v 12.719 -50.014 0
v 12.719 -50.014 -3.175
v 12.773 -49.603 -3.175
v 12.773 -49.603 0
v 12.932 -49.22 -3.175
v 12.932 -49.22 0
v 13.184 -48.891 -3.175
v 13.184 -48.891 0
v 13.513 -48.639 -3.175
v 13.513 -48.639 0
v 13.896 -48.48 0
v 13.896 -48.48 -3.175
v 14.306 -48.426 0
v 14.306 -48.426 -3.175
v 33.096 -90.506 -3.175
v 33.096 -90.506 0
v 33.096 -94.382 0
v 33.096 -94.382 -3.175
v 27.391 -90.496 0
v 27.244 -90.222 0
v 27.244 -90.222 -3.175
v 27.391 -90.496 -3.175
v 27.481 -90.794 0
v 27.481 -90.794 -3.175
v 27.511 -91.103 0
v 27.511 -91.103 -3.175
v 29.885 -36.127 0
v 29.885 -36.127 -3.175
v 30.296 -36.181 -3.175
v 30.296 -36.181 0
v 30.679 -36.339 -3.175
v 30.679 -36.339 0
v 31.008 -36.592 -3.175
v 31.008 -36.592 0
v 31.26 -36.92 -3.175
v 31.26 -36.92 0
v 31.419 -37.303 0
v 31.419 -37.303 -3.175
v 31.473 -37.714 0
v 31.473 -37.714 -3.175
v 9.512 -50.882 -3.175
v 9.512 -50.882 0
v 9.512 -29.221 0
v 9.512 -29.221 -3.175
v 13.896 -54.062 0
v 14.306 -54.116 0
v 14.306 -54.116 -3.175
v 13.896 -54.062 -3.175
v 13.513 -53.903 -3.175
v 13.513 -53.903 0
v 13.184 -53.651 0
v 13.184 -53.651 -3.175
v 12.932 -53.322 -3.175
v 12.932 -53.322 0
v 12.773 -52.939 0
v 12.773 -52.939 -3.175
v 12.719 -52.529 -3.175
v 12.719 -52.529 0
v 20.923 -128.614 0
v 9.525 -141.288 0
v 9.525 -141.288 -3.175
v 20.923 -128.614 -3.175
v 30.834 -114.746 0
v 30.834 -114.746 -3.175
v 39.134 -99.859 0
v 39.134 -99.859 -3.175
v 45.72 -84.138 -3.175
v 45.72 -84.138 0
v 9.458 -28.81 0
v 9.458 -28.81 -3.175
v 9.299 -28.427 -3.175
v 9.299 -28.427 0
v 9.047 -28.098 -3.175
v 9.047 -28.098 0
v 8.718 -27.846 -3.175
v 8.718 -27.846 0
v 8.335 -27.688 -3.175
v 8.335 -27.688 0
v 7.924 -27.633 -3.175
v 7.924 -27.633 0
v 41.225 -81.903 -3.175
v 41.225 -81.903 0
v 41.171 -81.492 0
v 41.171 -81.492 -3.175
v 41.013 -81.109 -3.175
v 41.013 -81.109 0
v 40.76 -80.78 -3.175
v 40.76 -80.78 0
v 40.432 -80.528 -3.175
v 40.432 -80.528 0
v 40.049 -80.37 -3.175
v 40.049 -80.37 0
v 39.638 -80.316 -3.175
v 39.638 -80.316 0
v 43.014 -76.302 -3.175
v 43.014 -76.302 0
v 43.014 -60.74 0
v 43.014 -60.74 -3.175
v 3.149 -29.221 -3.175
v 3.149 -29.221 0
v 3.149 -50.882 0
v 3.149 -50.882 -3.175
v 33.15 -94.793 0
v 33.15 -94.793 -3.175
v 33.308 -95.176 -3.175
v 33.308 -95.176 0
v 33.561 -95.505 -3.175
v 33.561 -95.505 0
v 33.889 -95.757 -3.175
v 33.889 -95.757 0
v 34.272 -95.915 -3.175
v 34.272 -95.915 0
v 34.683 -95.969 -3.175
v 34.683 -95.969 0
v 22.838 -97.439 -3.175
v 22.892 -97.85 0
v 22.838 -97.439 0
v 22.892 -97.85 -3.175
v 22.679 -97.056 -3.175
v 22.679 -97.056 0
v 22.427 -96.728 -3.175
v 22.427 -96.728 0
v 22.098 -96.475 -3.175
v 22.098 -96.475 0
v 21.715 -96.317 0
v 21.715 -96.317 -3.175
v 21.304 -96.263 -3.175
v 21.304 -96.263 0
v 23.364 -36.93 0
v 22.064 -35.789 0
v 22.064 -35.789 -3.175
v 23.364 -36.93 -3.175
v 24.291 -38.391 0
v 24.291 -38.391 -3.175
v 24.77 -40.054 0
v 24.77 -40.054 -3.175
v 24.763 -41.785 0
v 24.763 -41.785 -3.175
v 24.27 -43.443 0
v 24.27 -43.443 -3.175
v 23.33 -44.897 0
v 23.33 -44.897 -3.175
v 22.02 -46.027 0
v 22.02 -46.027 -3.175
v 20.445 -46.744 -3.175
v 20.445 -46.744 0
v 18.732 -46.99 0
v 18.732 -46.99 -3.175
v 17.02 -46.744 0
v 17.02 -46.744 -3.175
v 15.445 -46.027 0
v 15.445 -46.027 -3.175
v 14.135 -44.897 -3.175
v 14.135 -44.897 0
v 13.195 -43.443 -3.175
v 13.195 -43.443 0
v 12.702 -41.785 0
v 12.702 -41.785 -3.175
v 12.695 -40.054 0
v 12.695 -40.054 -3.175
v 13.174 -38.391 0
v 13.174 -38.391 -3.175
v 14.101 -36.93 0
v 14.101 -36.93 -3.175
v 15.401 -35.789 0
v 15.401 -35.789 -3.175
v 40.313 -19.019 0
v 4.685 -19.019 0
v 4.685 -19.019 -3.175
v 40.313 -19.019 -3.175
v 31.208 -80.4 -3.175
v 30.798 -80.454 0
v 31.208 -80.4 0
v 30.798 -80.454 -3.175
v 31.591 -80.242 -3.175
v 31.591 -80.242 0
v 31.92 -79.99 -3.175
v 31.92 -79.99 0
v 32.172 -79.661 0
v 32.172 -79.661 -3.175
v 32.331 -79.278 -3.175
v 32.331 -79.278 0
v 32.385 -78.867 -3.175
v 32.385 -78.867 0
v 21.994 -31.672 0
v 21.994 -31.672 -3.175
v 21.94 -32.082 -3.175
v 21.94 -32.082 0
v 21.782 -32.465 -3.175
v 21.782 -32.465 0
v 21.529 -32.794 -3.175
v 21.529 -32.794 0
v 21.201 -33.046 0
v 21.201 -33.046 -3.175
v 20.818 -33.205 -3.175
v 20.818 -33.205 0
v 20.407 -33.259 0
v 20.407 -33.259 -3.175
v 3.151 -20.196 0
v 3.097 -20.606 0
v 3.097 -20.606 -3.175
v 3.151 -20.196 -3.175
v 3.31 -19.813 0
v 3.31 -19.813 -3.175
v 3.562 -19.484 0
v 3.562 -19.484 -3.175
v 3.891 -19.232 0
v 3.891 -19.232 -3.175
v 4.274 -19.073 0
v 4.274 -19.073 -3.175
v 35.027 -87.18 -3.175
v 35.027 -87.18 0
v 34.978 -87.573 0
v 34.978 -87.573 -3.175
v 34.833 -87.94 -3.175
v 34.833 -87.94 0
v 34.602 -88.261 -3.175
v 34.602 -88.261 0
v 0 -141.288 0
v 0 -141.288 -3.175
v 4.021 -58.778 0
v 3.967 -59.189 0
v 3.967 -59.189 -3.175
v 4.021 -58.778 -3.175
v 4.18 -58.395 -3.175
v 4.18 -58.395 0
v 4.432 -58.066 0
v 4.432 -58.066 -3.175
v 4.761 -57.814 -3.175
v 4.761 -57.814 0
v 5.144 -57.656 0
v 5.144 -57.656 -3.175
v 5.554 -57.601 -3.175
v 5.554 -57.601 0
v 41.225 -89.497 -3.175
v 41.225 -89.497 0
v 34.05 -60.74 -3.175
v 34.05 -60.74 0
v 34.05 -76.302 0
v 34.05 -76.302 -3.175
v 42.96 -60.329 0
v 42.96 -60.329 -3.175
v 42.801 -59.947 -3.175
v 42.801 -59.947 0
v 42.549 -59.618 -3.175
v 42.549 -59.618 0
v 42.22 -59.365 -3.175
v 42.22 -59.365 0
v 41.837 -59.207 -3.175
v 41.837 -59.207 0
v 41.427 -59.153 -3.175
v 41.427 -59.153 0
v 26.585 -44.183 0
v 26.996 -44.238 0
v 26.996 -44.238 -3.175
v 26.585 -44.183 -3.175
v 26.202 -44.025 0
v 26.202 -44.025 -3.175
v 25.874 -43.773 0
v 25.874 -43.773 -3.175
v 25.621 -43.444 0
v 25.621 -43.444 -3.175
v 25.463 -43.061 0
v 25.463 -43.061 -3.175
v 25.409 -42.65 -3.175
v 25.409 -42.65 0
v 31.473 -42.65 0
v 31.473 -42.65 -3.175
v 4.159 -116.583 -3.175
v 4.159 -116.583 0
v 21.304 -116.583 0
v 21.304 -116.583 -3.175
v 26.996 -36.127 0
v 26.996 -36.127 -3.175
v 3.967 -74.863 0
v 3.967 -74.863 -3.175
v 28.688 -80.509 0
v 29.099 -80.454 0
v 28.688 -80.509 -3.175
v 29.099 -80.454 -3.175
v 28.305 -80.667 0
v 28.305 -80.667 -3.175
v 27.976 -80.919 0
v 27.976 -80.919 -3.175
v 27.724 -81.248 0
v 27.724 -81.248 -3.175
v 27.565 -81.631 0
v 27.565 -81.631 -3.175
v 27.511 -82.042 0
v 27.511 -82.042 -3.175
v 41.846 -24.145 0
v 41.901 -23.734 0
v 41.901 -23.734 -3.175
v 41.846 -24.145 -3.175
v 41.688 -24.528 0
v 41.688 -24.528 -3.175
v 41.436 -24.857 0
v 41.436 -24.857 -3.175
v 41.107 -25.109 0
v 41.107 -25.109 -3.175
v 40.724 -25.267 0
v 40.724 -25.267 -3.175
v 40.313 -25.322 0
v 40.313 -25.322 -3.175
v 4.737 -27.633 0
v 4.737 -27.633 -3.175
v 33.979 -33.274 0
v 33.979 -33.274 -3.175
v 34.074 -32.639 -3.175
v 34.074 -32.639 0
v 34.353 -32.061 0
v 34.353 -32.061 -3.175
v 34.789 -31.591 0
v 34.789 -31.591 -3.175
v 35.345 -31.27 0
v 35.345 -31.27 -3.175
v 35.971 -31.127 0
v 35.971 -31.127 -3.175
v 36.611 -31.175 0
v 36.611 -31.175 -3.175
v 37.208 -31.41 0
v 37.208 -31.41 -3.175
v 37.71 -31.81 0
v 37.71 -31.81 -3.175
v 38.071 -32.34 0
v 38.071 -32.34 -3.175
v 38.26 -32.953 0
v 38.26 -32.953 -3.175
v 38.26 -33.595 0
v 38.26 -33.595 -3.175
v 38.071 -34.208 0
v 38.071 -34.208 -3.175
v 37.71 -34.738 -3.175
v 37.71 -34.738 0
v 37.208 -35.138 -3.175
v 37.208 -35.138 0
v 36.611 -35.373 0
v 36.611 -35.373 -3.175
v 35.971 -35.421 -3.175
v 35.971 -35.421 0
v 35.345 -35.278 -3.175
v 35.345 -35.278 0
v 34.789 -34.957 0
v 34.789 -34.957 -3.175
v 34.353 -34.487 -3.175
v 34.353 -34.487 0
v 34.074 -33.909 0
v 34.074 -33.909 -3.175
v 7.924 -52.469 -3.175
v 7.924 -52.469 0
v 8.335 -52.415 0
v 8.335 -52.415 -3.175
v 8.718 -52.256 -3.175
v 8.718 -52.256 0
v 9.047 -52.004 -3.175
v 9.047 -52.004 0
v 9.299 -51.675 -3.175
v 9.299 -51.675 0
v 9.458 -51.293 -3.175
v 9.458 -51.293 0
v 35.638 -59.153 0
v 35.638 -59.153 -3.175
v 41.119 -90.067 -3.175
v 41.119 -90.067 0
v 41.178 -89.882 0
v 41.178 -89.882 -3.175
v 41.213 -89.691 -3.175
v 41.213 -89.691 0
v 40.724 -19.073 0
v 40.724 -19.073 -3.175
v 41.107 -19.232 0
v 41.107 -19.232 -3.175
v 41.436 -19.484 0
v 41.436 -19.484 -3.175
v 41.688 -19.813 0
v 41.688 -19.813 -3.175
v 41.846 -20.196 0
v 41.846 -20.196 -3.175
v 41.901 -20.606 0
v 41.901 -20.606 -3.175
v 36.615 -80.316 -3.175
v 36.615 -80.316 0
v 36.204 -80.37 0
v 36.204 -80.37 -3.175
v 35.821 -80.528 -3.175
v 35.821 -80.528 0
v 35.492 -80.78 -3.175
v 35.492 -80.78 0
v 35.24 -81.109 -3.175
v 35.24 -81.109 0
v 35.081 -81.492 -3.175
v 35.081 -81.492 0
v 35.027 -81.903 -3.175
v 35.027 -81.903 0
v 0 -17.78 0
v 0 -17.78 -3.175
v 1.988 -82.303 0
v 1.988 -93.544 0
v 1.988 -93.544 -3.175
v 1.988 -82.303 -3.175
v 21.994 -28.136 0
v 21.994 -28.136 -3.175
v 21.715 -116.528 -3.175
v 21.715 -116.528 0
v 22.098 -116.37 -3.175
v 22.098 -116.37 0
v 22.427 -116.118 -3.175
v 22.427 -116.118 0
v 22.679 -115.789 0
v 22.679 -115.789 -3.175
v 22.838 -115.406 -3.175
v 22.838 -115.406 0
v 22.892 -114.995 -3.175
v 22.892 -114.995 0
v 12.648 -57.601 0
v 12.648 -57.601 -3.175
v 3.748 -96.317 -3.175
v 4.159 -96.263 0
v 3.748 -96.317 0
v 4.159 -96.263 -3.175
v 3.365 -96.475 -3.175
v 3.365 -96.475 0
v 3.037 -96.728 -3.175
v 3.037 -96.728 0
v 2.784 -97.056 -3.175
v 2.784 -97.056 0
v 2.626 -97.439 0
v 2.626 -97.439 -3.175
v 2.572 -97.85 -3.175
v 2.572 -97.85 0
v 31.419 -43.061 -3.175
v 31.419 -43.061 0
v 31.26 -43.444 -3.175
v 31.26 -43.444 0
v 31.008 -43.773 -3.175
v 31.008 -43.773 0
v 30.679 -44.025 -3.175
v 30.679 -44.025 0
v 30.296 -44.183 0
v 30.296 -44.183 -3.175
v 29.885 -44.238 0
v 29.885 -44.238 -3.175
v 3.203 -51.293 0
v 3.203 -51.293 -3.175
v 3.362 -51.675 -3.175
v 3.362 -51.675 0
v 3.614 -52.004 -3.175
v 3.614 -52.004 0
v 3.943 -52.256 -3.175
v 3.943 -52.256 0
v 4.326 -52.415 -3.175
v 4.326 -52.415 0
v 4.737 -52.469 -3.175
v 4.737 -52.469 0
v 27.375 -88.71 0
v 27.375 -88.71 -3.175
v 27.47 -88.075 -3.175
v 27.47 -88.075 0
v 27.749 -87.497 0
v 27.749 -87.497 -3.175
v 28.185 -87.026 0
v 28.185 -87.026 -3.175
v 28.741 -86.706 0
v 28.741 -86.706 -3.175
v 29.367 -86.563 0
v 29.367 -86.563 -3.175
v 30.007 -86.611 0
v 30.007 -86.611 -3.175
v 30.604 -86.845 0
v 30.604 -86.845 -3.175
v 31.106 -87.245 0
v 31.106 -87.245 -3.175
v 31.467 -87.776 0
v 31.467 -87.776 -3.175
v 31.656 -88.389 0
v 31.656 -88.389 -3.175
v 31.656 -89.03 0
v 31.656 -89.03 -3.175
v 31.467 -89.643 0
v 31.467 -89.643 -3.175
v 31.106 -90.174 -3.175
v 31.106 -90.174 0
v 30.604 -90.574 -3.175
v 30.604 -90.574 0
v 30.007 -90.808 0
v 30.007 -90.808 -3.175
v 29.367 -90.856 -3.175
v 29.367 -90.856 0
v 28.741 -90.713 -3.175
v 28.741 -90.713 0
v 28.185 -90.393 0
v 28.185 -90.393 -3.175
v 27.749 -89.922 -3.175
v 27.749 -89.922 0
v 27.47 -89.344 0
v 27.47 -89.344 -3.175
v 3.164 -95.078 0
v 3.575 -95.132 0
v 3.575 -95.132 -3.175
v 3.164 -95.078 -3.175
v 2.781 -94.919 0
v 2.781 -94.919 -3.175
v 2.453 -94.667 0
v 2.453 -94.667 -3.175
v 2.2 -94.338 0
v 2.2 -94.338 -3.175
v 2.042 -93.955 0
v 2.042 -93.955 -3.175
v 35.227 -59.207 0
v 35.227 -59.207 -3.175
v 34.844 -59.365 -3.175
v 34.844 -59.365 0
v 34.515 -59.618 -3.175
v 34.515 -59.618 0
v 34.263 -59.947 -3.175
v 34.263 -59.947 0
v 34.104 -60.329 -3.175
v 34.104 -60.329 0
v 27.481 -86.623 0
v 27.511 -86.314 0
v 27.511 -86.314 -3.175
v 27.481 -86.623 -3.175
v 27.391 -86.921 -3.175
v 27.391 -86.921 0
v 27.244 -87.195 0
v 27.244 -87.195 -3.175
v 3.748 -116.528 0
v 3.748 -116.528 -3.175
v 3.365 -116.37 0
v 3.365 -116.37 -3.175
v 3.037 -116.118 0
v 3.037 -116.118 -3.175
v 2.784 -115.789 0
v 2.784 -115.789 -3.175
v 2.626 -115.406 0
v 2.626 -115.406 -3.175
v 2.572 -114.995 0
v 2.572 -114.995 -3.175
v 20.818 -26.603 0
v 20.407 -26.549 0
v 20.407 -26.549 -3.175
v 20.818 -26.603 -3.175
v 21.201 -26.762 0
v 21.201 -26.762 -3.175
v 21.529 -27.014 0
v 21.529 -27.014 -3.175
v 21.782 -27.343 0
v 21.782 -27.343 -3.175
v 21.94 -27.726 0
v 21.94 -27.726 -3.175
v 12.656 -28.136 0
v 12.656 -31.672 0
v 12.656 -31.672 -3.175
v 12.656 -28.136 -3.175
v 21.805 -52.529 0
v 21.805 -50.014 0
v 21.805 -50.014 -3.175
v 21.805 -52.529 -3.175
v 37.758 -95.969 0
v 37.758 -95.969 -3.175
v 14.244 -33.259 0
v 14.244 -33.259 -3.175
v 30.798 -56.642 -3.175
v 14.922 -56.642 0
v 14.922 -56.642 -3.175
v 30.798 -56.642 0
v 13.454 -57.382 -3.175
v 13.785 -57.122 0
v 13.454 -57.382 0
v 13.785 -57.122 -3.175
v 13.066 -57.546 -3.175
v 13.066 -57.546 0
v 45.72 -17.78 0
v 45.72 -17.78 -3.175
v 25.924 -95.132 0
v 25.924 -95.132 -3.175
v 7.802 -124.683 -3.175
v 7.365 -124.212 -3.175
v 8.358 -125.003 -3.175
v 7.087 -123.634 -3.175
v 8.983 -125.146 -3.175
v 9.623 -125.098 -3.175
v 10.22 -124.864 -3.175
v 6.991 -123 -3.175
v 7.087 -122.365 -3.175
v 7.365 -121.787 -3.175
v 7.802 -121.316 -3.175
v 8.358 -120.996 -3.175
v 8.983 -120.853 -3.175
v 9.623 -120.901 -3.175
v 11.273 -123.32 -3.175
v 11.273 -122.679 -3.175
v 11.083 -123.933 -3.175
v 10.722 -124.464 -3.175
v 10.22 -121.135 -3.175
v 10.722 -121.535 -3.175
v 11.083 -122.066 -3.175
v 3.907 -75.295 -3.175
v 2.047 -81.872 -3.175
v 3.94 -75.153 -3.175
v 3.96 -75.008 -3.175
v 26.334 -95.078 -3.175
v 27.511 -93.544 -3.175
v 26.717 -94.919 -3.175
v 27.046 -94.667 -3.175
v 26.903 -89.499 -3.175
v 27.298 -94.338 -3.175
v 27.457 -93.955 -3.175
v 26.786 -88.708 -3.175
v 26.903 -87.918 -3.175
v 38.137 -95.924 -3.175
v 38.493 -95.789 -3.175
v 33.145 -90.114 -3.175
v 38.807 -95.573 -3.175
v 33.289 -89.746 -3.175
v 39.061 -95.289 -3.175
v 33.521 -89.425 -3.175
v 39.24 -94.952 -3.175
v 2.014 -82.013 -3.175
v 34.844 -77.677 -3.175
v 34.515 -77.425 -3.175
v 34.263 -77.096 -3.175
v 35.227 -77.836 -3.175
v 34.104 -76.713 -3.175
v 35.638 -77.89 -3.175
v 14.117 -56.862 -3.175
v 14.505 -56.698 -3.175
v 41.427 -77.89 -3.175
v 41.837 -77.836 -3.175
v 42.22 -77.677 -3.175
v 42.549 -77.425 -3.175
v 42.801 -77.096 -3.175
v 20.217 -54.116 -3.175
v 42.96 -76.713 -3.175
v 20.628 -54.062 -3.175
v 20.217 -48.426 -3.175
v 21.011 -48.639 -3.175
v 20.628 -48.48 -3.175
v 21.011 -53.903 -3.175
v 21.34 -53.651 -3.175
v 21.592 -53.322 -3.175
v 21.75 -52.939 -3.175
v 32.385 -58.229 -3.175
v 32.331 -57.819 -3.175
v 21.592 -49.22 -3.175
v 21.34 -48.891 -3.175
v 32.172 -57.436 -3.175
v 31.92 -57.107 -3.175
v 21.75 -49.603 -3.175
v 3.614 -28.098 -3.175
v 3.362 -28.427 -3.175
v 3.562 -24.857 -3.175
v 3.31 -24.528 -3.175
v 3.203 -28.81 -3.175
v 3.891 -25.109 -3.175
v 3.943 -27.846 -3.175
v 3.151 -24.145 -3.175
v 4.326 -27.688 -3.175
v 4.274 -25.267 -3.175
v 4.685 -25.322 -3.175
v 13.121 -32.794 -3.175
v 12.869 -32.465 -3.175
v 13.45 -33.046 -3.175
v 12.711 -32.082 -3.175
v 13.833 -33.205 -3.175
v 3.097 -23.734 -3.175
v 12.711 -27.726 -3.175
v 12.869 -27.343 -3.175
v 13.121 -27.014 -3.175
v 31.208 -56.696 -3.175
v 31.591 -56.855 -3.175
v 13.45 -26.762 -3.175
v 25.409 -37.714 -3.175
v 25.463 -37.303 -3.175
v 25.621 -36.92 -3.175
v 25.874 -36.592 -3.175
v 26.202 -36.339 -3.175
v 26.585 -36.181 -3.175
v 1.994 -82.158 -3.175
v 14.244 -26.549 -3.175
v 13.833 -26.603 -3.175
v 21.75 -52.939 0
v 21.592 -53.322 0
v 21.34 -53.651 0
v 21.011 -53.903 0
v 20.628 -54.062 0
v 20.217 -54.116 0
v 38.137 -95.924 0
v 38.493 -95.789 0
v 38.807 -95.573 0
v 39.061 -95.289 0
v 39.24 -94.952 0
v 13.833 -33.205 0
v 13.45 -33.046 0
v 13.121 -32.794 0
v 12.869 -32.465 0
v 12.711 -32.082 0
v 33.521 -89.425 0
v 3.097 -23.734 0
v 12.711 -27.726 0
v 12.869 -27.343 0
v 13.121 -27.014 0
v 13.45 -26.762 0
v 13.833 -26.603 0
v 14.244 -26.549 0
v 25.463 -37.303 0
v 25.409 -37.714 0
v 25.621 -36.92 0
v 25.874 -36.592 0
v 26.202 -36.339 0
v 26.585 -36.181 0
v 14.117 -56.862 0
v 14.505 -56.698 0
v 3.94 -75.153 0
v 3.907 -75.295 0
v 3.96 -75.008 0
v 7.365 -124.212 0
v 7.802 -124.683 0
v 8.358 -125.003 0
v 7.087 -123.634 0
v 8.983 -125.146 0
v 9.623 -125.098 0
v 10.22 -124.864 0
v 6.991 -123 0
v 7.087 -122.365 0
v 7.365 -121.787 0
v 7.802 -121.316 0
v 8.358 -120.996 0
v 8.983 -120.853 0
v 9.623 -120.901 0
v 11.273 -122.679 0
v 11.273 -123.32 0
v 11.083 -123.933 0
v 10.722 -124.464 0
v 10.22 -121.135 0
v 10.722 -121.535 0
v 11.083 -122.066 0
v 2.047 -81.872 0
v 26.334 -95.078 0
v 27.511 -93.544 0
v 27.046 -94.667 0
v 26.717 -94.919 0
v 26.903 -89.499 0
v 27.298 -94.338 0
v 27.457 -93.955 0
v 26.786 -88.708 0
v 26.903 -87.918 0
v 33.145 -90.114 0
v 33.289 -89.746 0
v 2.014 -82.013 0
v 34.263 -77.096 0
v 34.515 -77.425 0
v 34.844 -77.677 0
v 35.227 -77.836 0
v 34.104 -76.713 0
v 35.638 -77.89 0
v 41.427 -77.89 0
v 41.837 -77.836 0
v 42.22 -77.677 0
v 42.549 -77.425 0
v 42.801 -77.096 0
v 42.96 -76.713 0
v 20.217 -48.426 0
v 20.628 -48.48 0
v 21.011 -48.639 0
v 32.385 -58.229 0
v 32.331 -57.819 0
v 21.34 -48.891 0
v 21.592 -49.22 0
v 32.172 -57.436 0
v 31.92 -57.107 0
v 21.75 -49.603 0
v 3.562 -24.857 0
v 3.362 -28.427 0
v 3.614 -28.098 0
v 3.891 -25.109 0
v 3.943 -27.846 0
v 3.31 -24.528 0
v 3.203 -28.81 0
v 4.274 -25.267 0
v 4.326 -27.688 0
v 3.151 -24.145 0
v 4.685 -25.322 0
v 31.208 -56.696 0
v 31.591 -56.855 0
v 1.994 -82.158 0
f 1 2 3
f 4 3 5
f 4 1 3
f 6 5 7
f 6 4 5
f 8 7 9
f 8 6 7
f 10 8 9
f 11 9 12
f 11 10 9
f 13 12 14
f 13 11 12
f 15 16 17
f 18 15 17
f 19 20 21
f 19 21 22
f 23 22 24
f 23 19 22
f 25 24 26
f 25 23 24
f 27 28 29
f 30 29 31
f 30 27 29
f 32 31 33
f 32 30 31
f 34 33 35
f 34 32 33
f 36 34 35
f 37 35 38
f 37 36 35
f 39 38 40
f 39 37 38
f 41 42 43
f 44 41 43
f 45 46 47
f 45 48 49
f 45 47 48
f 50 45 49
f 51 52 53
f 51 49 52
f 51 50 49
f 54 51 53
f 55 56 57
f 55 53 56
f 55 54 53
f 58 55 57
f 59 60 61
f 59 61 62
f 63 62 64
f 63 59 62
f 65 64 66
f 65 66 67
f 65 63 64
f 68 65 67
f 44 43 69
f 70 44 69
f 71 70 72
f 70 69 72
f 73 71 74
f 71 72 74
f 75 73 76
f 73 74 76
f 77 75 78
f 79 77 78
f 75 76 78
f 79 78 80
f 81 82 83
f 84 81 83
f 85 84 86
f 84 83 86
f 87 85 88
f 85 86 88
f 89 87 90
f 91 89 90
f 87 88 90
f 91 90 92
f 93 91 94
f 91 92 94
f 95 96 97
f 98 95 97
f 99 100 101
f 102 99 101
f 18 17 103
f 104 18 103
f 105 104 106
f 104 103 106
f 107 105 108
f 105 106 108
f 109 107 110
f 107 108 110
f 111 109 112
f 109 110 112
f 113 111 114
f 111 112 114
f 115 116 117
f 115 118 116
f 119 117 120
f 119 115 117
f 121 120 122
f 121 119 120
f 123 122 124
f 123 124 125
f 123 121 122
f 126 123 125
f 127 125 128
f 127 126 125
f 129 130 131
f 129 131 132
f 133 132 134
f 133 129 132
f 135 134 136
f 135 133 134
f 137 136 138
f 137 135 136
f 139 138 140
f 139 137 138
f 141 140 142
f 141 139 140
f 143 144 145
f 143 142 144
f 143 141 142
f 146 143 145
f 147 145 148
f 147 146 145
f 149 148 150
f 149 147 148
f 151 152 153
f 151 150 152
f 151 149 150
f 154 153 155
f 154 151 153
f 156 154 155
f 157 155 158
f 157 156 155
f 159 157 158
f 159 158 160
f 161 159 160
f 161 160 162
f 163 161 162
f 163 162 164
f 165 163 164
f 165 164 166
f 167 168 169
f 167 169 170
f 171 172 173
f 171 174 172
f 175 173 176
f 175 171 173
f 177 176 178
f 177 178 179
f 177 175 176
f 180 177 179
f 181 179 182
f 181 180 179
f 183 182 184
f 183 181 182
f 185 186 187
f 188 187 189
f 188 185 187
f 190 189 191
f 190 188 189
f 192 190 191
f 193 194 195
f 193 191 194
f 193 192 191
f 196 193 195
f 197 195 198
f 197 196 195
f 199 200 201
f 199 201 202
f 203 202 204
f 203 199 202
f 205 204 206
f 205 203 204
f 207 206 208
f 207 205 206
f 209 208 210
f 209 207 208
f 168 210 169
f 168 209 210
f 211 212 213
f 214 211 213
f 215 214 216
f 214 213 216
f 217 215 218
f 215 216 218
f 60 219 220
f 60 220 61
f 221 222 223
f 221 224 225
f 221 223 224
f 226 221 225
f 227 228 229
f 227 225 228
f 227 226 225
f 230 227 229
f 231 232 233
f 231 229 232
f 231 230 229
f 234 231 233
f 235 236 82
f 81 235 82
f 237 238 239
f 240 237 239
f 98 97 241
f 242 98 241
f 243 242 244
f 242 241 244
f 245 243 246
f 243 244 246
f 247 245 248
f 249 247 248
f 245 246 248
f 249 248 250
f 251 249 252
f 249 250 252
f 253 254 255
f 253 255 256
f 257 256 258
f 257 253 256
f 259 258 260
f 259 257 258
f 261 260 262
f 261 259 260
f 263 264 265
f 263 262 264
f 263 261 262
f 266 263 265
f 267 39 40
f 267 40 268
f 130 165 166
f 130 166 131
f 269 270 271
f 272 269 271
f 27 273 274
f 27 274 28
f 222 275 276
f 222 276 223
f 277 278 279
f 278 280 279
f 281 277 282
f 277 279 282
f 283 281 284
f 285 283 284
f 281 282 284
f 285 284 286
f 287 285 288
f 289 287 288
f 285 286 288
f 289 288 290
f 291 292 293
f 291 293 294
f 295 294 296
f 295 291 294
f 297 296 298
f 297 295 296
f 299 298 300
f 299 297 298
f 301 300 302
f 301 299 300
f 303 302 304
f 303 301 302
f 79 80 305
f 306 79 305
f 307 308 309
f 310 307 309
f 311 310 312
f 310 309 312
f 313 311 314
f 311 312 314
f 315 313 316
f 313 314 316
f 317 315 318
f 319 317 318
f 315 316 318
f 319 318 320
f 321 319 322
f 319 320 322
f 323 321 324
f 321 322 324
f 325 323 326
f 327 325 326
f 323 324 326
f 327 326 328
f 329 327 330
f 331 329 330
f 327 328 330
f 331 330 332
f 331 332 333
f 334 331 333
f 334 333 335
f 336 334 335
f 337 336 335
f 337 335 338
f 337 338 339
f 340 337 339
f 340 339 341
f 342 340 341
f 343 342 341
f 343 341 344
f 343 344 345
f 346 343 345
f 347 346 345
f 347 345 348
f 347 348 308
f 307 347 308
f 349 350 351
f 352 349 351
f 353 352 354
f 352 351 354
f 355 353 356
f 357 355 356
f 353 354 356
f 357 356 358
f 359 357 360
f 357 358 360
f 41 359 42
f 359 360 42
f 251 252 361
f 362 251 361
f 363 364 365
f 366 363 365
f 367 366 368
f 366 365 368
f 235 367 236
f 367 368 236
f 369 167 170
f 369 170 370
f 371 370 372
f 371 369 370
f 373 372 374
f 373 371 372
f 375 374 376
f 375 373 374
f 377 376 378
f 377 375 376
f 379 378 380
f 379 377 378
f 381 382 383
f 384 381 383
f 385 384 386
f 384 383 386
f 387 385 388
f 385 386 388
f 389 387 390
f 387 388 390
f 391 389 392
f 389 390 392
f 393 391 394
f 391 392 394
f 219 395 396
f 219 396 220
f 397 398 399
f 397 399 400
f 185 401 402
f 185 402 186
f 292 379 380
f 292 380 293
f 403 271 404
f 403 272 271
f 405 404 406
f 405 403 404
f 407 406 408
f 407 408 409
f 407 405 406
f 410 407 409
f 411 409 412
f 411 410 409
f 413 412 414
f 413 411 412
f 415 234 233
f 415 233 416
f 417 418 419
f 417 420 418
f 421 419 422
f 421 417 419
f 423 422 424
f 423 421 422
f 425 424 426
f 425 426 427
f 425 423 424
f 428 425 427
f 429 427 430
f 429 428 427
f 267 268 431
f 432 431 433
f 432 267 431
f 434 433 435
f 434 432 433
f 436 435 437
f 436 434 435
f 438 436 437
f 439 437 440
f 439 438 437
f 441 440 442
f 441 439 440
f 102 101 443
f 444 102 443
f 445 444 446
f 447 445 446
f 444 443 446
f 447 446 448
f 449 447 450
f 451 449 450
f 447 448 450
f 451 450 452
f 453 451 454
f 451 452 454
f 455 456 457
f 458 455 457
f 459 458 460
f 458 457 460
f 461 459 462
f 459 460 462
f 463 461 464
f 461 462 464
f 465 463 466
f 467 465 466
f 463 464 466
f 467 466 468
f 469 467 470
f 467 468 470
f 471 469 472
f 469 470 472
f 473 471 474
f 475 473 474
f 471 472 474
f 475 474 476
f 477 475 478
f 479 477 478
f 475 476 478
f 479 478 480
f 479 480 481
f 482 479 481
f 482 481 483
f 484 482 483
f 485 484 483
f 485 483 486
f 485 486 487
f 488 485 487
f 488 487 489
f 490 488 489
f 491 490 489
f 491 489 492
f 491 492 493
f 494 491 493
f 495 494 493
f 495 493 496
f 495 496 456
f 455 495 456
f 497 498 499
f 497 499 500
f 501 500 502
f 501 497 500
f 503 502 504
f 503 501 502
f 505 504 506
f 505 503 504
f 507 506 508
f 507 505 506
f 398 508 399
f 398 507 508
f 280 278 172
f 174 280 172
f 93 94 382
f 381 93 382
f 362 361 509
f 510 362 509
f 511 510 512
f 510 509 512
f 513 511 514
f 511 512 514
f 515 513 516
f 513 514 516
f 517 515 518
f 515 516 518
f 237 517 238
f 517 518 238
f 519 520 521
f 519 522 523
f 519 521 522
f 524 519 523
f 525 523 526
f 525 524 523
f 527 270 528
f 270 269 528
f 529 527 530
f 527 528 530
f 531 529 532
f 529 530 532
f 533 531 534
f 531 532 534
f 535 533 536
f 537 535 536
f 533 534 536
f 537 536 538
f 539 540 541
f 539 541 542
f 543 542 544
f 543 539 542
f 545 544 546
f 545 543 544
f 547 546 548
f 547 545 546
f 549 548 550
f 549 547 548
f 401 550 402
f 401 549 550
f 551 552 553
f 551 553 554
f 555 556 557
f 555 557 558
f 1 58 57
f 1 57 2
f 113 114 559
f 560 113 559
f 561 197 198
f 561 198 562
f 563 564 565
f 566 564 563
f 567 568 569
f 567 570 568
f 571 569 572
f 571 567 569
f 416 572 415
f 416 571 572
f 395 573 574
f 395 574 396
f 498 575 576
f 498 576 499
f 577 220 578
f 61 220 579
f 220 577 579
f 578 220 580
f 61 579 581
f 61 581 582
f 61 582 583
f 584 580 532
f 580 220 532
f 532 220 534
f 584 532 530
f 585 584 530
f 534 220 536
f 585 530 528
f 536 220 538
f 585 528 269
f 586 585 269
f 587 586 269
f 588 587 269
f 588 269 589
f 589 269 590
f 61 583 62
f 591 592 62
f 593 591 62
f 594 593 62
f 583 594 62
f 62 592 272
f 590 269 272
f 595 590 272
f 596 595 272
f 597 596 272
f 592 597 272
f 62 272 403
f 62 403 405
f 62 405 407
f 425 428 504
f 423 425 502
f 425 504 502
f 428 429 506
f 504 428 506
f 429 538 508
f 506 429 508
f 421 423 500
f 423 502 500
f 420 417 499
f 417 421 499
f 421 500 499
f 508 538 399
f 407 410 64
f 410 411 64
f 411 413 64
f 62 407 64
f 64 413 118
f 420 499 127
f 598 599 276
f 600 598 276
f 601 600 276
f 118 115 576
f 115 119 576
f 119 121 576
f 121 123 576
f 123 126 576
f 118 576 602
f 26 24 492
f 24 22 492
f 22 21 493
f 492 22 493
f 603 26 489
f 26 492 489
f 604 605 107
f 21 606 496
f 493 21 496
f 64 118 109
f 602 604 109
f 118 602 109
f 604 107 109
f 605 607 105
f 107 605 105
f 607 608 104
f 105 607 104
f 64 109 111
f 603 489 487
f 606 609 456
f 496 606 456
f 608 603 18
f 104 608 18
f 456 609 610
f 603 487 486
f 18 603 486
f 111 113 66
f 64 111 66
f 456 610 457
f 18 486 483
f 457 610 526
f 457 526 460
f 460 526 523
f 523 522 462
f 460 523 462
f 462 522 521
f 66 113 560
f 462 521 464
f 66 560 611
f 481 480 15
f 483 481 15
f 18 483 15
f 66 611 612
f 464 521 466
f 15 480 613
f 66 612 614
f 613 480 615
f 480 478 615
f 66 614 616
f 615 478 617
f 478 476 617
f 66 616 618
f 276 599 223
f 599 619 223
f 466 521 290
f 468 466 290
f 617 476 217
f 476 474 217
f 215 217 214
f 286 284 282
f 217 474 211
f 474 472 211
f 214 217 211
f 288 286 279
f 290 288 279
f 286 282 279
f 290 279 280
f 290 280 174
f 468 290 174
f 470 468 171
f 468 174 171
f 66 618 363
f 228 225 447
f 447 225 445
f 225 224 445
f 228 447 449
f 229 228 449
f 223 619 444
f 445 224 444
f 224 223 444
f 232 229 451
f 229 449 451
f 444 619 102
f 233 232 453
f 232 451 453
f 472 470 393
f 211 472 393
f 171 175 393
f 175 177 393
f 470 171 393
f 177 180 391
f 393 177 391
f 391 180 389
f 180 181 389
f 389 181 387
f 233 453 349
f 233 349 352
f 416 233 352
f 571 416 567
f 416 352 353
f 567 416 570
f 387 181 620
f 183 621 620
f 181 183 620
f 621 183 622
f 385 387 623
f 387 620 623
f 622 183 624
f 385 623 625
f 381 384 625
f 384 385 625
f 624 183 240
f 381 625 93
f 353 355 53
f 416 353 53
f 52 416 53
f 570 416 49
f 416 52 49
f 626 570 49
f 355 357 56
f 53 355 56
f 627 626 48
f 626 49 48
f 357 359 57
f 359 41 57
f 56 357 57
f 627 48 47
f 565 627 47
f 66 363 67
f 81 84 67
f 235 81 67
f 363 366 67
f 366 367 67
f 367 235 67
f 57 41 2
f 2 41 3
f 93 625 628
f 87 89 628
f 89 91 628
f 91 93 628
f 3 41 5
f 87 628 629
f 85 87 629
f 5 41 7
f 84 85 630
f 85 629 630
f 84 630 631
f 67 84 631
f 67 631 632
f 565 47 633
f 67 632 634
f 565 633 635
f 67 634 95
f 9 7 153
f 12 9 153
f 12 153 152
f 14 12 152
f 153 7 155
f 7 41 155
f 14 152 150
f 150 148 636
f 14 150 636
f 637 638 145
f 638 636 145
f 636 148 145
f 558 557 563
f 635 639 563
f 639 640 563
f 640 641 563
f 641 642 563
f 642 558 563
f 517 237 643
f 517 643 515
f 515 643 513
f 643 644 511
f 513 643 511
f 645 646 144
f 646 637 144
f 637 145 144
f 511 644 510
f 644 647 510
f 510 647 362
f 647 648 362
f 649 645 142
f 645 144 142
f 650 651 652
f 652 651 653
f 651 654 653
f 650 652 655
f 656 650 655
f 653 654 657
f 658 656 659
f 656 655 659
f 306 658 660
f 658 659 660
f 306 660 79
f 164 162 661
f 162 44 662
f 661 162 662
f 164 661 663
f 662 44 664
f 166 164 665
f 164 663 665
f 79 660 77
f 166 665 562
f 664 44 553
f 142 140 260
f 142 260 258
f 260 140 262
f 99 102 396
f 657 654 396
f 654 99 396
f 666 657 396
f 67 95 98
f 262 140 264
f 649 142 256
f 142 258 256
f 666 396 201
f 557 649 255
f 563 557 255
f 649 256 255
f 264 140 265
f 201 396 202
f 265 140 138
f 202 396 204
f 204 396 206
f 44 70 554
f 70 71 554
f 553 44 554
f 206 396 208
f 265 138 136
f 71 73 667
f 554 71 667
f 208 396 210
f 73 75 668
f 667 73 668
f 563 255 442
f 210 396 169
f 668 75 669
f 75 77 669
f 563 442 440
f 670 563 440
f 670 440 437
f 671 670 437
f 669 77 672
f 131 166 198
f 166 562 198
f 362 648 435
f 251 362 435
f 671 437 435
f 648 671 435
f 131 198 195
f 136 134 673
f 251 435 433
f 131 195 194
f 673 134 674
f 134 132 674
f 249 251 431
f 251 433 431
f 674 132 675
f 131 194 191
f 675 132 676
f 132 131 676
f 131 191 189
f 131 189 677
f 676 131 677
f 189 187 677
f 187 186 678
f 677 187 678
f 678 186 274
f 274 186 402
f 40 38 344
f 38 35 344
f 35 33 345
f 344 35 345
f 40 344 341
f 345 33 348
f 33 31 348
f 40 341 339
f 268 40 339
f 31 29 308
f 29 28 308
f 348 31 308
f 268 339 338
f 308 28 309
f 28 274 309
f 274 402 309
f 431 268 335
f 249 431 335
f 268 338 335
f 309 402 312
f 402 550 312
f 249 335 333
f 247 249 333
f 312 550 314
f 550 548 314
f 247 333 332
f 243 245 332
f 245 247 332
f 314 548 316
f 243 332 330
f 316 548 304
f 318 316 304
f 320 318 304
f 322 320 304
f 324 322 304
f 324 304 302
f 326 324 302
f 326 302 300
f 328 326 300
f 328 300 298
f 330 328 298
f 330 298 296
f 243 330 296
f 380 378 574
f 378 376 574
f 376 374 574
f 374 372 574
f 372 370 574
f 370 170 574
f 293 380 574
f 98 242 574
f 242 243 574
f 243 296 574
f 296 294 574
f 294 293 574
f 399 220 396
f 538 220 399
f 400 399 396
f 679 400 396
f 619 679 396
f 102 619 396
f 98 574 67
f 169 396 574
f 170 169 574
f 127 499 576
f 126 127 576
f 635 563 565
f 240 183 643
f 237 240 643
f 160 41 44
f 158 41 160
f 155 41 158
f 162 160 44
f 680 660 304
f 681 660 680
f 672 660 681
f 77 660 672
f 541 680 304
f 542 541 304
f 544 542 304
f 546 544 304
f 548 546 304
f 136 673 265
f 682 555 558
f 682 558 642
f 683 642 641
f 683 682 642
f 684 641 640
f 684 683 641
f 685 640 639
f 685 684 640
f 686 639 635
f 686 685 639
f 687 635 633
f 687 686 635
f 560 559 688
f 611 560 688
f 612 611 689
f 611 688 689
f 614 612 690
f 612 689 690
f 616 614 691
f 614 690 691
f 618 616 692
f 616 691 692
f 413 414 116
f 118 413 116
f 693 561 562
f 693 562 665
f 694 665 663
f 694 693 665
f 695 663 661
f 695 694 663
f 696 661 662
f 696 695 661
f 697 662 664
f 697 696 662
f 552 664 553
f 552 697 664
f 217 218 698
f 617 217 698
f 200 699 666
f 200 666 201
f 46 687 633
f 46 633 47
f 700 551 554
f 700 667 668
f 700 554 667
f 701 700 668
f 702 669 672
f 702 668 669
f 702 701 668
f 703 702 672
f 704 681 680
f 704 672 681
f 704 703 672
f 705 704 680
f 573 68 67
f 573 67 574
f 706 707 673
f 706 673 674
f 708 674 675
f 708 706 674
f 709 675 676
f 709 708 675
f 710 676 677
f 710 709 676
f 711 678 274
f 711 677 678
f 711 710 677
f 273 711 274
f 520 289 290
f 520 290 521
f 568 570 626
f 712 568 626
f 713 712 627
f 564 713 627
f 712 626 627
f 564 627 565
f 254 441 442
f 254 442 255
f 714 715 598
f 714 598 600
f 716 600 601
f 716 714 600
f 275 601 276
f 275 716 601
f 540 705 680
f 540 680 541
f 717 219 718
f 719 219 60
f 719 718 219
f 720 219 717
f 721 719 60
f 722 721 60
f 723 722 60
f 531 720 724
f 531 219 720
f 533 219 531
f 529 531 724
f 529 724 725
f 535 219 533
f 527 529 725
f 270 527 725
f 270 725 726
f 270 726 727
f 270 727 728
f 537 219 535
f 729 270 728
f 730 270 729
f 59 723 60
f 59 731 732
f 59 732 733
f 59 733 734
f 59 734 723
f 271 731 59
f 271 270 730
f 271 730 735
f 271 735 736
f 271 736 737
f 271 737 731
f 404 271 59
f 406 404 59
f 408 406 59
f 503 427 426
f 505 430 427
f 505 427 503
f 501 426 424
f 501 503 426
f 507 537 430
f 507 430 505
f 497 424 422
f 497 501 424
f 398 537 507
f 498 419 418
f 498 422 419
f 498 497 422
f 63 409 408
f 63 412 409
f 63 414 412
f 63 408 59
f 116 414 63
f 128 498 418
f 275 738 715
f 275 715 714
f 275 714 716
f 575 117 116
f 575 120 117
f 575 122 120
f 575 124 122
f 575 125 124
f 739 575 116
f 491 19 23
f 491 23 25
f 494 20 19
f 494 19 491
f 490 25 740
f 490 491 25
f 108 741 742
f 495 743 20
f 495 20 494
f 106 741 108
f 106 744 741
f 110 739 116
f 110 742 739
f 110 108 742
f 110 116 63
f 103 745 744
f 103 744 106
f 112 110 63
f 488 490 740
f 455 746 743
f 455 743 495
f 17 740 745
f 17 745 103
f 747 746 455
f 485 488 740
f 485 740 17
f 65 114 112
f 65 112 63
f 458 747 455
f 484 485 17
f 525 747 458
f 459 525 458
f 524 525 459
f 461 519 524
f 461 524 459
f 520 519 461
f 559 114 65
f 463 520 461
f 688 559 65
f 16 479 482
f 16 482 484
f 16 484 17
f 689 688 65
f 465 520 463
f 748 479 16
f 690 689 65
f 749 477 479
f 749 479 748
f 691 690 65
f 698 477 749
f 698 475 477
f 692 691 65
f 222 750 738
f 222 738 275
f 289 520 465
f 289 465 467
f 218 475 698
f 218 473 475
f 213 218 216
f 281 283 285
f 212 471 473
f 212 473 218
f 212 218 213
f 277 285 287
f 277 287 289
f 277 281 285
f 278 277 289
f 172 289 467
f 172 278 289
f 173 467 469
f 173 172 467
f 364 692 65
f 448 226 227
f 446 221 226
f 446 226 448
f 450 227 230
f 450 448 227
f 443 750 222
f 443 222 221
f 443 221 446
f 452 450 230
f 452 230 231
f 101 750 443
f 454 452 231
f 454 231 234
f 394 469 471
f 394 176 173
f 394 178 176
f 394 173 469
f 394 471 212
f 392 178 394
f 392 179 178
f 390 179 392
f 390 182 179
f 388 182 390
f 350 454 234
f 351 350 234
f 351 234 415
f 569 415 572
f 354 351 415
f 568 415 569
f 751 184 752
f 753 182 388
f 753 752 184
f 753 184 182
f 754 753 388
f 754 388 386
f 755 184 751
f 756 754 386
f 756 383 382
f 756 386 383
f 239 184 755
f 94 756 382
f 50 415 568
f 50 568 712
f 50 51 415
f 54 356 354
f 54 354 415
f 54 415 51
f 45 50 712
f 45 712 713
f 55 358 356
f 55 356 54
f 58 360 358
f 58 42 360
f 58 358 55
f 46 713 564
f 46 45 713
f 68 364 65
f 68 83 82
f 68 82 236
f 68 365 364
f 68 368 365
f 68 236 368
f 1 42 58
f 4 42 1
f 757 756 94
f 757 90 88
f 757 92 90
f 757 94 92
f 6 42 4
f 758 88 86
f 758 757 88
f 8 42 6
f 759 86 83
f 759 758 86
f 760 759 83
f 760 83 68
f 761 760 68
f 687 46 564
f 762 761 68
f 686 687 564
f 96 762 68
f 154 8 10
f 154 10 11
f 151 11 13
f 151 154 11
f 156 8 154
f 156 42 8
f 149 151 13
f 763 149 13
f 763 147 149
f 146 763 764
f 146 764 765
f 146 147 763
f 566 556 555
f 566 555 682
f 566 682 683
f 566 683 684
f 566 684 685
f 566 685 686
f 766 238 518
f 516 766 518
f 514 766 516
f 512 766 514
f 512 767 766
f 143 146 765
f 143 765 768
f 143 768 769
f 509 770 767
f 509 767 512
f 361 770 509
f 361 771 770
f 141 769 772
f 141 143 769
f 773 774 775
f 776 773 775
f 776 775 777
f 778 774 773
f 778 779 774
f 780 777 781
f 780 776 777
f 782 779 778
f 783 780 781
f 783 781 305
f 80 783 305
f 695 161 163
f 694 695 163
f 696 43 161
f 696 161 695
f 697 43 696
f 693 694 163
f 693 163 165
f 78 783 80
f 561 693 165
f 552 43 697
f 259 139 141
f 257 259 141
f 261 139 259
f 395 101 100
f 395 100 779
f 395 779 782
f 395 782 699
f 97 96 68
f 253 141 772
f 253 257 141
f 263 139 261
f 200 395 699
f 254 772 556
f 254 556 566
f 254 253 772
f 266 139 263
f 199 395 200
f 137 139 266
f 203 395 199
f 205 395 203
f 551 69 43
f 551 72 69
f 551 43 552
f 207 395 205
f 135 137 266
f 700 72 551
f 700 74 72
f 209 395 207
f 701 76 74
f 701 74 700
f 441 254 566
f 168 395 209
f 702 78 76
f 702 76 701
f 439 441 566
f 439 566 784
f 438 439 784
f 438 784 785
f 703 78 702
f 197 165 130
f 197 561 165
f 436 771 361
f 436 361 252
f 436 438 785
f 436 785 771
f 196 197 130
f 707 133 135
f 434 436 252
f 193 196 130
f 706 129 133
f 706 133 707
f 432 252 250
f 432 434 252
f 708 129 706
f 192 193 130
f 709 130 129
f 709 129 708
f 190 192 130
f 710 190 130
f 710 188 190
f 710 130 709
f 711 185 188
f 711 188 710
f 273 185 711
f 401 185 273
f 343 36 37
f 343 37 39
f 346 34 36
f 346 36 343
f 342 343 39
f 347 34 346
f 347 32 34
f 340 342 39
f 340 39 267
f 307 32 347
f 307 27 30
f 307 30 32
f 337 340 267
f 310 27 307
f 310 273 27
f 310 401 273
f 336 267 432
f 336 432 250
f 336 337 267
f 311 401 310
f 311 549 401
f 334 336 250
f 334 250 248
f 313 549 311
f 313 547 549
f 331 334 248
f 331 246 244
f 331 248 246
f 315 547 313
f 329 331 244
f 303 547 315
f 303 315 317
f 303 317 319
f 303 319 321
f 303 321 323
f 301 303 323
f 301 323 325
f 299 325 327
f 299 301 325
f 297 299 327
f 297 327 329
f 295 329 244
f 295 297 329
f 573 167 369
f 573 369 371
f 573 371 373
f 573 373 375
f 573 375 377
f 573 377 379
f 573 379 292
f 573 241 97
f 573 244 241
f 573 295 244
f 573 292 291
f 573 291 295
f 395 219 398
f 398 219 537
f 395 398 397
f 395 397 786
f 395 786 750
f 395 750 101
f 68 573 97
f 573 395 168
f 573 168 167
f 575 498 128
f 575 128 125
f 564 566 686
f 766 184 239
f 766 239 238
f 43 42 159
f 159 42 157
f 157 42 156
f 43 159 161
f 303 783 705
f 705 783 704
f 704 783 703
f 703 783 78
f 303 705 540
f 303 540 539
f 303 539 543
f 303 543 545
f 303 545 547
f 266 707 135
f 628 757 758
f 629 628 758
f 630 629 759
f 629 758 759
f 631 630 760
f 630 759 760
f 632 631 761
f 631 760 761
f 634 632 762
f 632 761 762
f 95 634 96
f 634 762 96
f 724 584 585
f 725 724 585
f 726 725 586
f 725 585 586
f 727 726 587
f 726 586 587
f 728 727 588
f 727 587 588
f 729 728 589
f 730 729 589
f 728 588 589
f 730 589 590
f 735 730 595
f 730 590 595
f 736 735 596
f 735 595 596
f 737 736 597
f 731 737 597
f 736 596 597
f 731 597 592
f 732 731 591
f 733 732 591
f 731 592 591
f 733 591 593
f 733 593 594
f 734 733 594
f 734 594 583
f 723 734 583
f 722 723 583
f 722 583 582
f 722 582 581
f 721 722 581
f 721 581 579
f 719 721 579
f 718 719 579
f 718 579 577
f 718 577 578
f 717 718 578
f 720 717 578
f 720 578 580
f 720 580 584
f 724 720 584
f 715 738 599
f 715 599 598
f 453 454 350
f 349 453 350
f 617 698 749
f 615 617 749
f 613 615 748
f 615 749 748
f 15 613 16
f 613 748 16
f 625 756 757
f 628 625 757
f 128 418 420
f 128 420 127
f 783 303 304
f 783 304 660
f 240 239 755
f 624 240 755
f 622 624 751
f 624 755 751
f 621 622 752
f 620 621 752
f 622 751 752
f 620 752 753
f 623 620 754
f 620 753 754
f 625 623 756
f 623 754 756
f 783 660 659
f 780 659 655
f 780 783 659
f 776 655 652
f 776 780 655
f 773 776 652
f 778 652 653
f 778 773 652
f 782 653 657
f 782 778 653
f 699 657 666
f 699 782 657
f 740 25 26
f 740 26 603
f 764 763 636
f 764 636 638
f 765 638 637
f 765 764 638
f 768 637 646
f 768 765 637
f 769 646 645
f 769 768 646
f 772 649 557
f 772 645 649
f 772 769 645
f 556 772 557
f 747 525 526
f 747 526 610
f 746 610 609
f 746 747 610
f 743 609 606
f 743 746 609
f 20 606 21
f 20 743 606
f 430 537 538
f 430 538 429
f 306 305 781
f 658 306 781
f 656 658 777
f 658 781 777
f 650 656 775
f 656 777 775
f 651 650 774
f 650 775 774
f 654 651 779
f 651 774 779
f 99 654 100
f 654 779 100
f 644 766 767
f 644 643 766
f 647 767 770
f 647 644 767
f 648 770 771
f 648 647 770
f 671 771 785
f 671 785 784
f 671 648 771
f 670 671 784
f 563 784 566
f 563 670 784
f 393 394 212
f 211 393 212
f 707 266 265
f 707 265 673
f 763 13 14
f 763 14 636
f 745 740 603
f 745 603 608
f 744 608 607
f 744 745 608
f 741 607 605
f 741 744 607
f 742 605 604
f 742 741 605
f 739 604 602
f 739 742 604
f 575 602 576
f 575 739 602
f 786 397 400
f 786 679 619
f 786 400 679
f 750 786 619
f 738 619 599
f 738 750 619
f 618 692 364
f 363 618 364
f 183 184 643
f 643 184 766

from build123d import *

# Parameters (mm, degrees)
SKETCH1_R             = 1.190050877
BOSS_EXTRUDE1_DEPTH   = 3.175
CUT_EXTRUDE1_DEPTH    = 4.175
SKETCH12_W            = 19.05
SKETCH12_H            = 23.8125
CUT_EXTRUDE2_DEPTH    = 4.175
SKETCH17_W            = 20.32
SKETCH17_H            = 20.32
CUT_EXTRUDE3_DEPTH    = 4.175
FILLET1_R             = 1.5875
F_6_CLEARANCE_HOLE1_D = 4.3053
CUT_EXTRUDE4_DEPTH    = 4.175
FILLET3_R             = 1.5875


with BuildPart() as part:
    # Sketch1 → Boss-Extrude1 (new body)
    with BuildSketch(Plane.XY):
        with BuildLine():
            Line((0, -17.78), (0, -141.2875))
            Line((0, -141.2875), (9.525, -141.2875))
            ThreePointArc((9.525, -141.2875), (30.833523511, -114.746148224), (45.72, -84.1375))
            Line((45.72, -84.1375), (45.72, -17.78))
            Line((45.72, -17.78), (0, -17.78))
        make_face()
        with Locations((18.7325, -40.894)):
            Circle(SKETCH1_R, mode=Mode.SUBTRACT)
    extrude(amount=-BOSS_EXTRUDE1_DEPTH)

    # Sketch11 → Cut-Extrude1 (cut, through all)
    with BuildSketch(Plane(origin=(20.844780046, -43.574770805, 0), x_dir=(1, 0, 0), z_dir=(0, 0, 1))):
        with BuildLine():
            Line((-5.443361979, 7.786170805), (1.218801886, 7.786170805))
            ThreePointArc((1.218801886, 7.786170805), (-2.112280046, -3.415229195), (-5.443361979, 7.786170805))
        make_face()
    extrude(amount=-CUT_EXTRUDE1_DEPTH, mode=Mode.SUBTRACT)

    # Sketch12 → Cut-Extrude2 (cut, through all)
    with BuildSketch(Plane.XY):
        with Locations((22.86, -68.54825)):
            Rectangle(SKETCH12_W, SKETCH12_H)
    extrude(amount=-CUT_EXTRUDE2_DEPTH, mode=Mode.SUBTRACT)

    # Sketch17 → Cut-Extrude3 (cut, through all)
    with BuildSketch(Plane.XY):
        with Locations((12.731722108, -106.422544949)):
            Rectangle(SKETCH17_W, SKETCH17_H)
    extrude(amount=-CUT_EXTRUDE3_DEPTH, mode=Mode.SUBTRACT)

    # Fillet1
    fillet1_edges = [part.edges().sort_by_distance(p)[0] for p in [
        (13.335, -80.4545, -1.5875),
        (13.335, -56.642, -1.5875),
        (32.385, -56.642, -1.5875),
        (32.385, -80.4545, -1.5875),
        (22.891722108, -96.262544949, -1.5875),
        (22.891722108, -116.582544949, -1.5875),
        (2.571722108, -116.582544949, -1.5875),
        (2.571722108, -96.262544949, -1.5875),
    ]]
    fillet(fillet1_edges, radius=FILLET1_R)

    # #6 Clearance Hole1 (through all)
    with Locations(Plane.XY):
        with Locations((9.144, -122.9995), (29.5275, -88.7095), (36.1315, -33.274)):
            Hole(F_6_CLEARANCE_HOLE1_D / 2)

    # Sketch20 → Cut-Extrude4 (cut, through all)
    with BuildSketch(Plane.XY):
        with BuildLine():
            Line((1.9875505, -93.544142926), (1.9875505, -82.303444681))
            ThreePointArc((1.9875505, -82.303444681), (2.002594465, -82.085411961), (2.04744123, -81.871511621))
            Line((2.04744123, -81.871511621), (3.907011168, -75.294806703))
            ThreePointArc((3.907011168, -75.294806703), (3.951857933, -75.080906363), (3.966901898, -74.862873644))
            Line((3.966901898, -74.862873644), (3.966901898, -59.18890883))
            ThreePointArc((3.966901898, -59.18890883), (4.431869883, -58.066376815), (5.554401898, -57.60140883))
            Line((5.554401898, -57.60140883), (9.117080567, -57.60140883))
            Line((9.117080567, -57.60140883), (27.511016487, -57.60140883))
            Line((27.511016487, -57.60140883), (27.511016487, -86.314118515))
            ThreePointArc((27.511016487, -86.314118515), (27.442924116, -86.774071456), (27.244488351, -87.194567028))
            ThreePointArc((27.244488351, -87.194567028), (26.786216014, -88.708422955), (27.244488351, -90.222278881))
            ThreePointArc((27.244488351, -90.222278881), (27.442924116, -90.642774454), (27.511016487, -91.102727395))
            Line((27.511016487, -91.102727395), (27.511016487, -93.544142926))
            ThreePointArc((27.511016487, -93.544142926), (27.046048502, -94.666674941), (25.923516487, -95.131642926))
            Line((25.923516487, -95.131642926), (3.5750505, -95.131642926))
            ThreePointArc((3.5750505, -95.131642926), (2.452518485, -94.666674941), (1.9875505, -93.544142926))
        make_face()
        with BuildLine():
            Line((39.239705373, -94.952090373), (41.119480948, -90.066805962))
            ThreePointArc((41.119480948, -90.066805962), (41.19867933, -89.78663398), (41.225378141, -89.49671003))
            Line((41.225378141, -89.49671003), (41.225378141, -81.903016886))
            ThreePointArc((41.225378141, -81.903016886), (40.760410156, -80.780484871), (39.637878141, -80.315516886))
            Line((39.637878141, -80.315516886), (36.61477648, -80.315516886))
            ThreePointArc((36.61477648, -80.315516886), (35.492244465, -80.780484871), (35.02727648, -81.903016886))
            Line((35.02727648, -81.903016886), (35.02727648, -87.180260326))
            ThreePointArc((35.02727648, -87.180260326), (34.917248136, -87.760978637), (34.602415054, -88.261198713))
            Line((34.602415054, -88.261198713), (33.520520126, -89.424866126))
            ThreePointArc((33.520520126, -89.424866126), (33.205687045, -89.925086202), (33.095658701, -90.505804513))
            Line((33.095658701, -90.505804513), (33.095658701, -94.381994441))
            ThreePointArc((33.095658701, -94.381994441), (33.560626686, -95.504526456), (34.683158701, -95.969494441))
            Line((34.683158701, -95.969494441), (37.758102566, -95.969494441))
            ThreePointArc((37.758102566, -95.969494441), (38.65674848, -95.690654737), (39.239705373, -94.952090373))
        make_face()
        with BuildLine():
            Line((20.217000424, -54.116093897), (14.306430977, -54.116093897))
            ThreePointArc((14.306430977, -54.116093897), (13.183898962, -53.651125912), (12.718930977, -52.528593897))
            Line((12.718930977, -52.528593897), (12.718930977, -50.013735278))
            ThreePointArc((12.718930977, -50.013735278), (13.183898962, -48.891203263), (14.306430977, -48.426235278))
            Line((14.306430977, -48.426235278), (20.217000424, -48.426235278))
            ThreePointArc((20.217000424, -48.426235278), (21.339532439, -48.891203263), (21.804500424, -50.013735278))
            Line((21.804500424, -50.013735278), (21.804500424, -52.528593897))
            ThreePointArc((21.804500424, -52.528593897), (21.339532439, -53.651125912), (20.217000424, -54.116093897))
        make_face()
        with BuildLine():
            Line((29.885101261, -44.237571754), (26.996152875, -44.237571754))
            ThreePointArc((26.996152875, -44.237571754), (25.87362086, -43.772603769), (25.408652875, -42.650071754))
            Line((25.408652875, -42.650071754), (25.408652875, -37.714249524))
            ThreePointArc((25.408652875, -37.714249524), (25.87362086, -36.591717509), (26.996152875, -36.126749524))
            Line((26.996152875, -36.126749524), (29.885101261, -36.126749524))
            ThreePointArc((29.885101261, -36.126749524), (31.007633276, -36.591717509), (31.472601261, -37.714249524))
            Line((31.472601261, -37.714249524), (31.472601261, -42.650071754))
            ThreePointArc((31.472601261, -42.650071754), (31.007633276, -43.772603769), (29.885101261, -44.237571754))
        make_face()
        with BuildLine():
            Line((20.406928746, -33.259078247), (14.243980141, -33.259078247))
            ThreePointArc((14.243980141, -33.259078247), (13.121448126, -32.794110262), (12.656480141, -31.671578247))
            Line((12.656480141, -31.671578247), (12.656480141, -28.136425111))
            ThreePointArc((12.656480141, -28.136425111), (13.121448126, -27.013893096), (14.243980141, -26.548925111))
            Line((14.243980141, -26.548925111), (20.406928746, -26.548925111))
            ThreePointArc((20.406928746, -26.548925111), (21.529460761, -27.013893096), (21.994428746, -28.136425111))
            Line((21.994428746, -28.136425111), (21.994428746, -31.671578247))
            ThreePointArc((21.994428746, -31.671578247), (21.529460761, -32.794110262), (20.406928746, -33.259078247))
        make_face()
        with BuildLine():
            Line((9.51166577, -50.881662937), (9.51166577, -29.220981566))
            ThreePointArc((9.51166577, -29.220981566), (9.046697786, -28.098449551), (7.92416577, -27.633481566))
            Line((7.92416577, -27.633481566), (4.736850702, -27.633481566))
            ThreePointArc((4.736850702, -27.633481566), (3.614318687, -28.098449551), (3.149350702, -29.220981566))
            Line((3.149350702, -29.220981566), (3.149350702, -50.881662937))
            ThreePointArc((3.149350702, -50.881662937), (3.614318687, -52.004194952), (4.736850702, -52.469162937))
            Line((4.736850702, -52.469162937), (7.92416577, -52.469162937))
            ThreePointArc((7.92416577, -52.469162937), (9.046697786, -52.004194952), (9.51166577, -50.881662937))
        make_face()
        with BuildLine():
            Line((40.313091041, -25.321573057), (4.684667753, -25.321573057))
            ThreePointArc((4.684667753, -25.321573057), (3.562135738, -24.856605072), (3.097167753, -23.734073057))
            Line((3.097167753, -23.734073057), (3.097167753, -20.606442704))
            ThreePointArc((3.097167753, -20.606442704), (3.562135738, -19.483910688), (4.684667753, -19.018942704))
            Line((4.684667753, -19.018942704), (40.313091041, -19.018942704))
            ThreePointArc((40.313091041, -19.018942704), (41.435623056, -19.483910688), (41.900591041, -20.606442704))
            Line((41.900591041, -20.606442704), (41.900591041, -23.734073057))
            ThreePointArc((41.900591041, -23.734073057), (41.435623056, -24.856605072), (40.313091041, -25.321573057))
        make_face()
        with BuildLine():
            Line((43.01404737, -76.302416551), (43.01404737, -60.74025149))
            ThreePointArc((43.01404737, -60.74025149), (42.549079385, -59.617719475), (41.42654737, -59.15275149))
            Line((41.42654737, -59.15275149), (35.637827713, -59.15275149))
            ThreePointArc((35.637827713, -59.15275149), (34.515295697, -59.617719475), (34.050327713, -60.74025149))
            Line((34.050327713, -60.74025149), (34.050327713, -76.302416551))
            ThreePointArc((34.050327713, -76.302416551), (34.515295697, -77.424948566), (35.637827713, -77.889916551))
            Line((35.637827713, -77.889916551), (41.42654737, -77.889916551))
            ThreePointArc((41.42654737, -77.889916551), (42.549079385, -77.424948566), (43.01404737, -76.302416551))
        make_face()
    extrude(amount=-CUT_EXTRUDE4_DEPTH, mode=Mode.SUBTRACT)

    # Fillet3
    fillet3_edges = [part.edges().sort_by_distance(p)[0] for p in [
        (13.464536443, -57.60140883, -1.5875),
        (27.511016487, -80.4545, -1.5875),
    ]]
    fillet(fillet3_edges, radius=FILLET3_R)


solid = part.part
